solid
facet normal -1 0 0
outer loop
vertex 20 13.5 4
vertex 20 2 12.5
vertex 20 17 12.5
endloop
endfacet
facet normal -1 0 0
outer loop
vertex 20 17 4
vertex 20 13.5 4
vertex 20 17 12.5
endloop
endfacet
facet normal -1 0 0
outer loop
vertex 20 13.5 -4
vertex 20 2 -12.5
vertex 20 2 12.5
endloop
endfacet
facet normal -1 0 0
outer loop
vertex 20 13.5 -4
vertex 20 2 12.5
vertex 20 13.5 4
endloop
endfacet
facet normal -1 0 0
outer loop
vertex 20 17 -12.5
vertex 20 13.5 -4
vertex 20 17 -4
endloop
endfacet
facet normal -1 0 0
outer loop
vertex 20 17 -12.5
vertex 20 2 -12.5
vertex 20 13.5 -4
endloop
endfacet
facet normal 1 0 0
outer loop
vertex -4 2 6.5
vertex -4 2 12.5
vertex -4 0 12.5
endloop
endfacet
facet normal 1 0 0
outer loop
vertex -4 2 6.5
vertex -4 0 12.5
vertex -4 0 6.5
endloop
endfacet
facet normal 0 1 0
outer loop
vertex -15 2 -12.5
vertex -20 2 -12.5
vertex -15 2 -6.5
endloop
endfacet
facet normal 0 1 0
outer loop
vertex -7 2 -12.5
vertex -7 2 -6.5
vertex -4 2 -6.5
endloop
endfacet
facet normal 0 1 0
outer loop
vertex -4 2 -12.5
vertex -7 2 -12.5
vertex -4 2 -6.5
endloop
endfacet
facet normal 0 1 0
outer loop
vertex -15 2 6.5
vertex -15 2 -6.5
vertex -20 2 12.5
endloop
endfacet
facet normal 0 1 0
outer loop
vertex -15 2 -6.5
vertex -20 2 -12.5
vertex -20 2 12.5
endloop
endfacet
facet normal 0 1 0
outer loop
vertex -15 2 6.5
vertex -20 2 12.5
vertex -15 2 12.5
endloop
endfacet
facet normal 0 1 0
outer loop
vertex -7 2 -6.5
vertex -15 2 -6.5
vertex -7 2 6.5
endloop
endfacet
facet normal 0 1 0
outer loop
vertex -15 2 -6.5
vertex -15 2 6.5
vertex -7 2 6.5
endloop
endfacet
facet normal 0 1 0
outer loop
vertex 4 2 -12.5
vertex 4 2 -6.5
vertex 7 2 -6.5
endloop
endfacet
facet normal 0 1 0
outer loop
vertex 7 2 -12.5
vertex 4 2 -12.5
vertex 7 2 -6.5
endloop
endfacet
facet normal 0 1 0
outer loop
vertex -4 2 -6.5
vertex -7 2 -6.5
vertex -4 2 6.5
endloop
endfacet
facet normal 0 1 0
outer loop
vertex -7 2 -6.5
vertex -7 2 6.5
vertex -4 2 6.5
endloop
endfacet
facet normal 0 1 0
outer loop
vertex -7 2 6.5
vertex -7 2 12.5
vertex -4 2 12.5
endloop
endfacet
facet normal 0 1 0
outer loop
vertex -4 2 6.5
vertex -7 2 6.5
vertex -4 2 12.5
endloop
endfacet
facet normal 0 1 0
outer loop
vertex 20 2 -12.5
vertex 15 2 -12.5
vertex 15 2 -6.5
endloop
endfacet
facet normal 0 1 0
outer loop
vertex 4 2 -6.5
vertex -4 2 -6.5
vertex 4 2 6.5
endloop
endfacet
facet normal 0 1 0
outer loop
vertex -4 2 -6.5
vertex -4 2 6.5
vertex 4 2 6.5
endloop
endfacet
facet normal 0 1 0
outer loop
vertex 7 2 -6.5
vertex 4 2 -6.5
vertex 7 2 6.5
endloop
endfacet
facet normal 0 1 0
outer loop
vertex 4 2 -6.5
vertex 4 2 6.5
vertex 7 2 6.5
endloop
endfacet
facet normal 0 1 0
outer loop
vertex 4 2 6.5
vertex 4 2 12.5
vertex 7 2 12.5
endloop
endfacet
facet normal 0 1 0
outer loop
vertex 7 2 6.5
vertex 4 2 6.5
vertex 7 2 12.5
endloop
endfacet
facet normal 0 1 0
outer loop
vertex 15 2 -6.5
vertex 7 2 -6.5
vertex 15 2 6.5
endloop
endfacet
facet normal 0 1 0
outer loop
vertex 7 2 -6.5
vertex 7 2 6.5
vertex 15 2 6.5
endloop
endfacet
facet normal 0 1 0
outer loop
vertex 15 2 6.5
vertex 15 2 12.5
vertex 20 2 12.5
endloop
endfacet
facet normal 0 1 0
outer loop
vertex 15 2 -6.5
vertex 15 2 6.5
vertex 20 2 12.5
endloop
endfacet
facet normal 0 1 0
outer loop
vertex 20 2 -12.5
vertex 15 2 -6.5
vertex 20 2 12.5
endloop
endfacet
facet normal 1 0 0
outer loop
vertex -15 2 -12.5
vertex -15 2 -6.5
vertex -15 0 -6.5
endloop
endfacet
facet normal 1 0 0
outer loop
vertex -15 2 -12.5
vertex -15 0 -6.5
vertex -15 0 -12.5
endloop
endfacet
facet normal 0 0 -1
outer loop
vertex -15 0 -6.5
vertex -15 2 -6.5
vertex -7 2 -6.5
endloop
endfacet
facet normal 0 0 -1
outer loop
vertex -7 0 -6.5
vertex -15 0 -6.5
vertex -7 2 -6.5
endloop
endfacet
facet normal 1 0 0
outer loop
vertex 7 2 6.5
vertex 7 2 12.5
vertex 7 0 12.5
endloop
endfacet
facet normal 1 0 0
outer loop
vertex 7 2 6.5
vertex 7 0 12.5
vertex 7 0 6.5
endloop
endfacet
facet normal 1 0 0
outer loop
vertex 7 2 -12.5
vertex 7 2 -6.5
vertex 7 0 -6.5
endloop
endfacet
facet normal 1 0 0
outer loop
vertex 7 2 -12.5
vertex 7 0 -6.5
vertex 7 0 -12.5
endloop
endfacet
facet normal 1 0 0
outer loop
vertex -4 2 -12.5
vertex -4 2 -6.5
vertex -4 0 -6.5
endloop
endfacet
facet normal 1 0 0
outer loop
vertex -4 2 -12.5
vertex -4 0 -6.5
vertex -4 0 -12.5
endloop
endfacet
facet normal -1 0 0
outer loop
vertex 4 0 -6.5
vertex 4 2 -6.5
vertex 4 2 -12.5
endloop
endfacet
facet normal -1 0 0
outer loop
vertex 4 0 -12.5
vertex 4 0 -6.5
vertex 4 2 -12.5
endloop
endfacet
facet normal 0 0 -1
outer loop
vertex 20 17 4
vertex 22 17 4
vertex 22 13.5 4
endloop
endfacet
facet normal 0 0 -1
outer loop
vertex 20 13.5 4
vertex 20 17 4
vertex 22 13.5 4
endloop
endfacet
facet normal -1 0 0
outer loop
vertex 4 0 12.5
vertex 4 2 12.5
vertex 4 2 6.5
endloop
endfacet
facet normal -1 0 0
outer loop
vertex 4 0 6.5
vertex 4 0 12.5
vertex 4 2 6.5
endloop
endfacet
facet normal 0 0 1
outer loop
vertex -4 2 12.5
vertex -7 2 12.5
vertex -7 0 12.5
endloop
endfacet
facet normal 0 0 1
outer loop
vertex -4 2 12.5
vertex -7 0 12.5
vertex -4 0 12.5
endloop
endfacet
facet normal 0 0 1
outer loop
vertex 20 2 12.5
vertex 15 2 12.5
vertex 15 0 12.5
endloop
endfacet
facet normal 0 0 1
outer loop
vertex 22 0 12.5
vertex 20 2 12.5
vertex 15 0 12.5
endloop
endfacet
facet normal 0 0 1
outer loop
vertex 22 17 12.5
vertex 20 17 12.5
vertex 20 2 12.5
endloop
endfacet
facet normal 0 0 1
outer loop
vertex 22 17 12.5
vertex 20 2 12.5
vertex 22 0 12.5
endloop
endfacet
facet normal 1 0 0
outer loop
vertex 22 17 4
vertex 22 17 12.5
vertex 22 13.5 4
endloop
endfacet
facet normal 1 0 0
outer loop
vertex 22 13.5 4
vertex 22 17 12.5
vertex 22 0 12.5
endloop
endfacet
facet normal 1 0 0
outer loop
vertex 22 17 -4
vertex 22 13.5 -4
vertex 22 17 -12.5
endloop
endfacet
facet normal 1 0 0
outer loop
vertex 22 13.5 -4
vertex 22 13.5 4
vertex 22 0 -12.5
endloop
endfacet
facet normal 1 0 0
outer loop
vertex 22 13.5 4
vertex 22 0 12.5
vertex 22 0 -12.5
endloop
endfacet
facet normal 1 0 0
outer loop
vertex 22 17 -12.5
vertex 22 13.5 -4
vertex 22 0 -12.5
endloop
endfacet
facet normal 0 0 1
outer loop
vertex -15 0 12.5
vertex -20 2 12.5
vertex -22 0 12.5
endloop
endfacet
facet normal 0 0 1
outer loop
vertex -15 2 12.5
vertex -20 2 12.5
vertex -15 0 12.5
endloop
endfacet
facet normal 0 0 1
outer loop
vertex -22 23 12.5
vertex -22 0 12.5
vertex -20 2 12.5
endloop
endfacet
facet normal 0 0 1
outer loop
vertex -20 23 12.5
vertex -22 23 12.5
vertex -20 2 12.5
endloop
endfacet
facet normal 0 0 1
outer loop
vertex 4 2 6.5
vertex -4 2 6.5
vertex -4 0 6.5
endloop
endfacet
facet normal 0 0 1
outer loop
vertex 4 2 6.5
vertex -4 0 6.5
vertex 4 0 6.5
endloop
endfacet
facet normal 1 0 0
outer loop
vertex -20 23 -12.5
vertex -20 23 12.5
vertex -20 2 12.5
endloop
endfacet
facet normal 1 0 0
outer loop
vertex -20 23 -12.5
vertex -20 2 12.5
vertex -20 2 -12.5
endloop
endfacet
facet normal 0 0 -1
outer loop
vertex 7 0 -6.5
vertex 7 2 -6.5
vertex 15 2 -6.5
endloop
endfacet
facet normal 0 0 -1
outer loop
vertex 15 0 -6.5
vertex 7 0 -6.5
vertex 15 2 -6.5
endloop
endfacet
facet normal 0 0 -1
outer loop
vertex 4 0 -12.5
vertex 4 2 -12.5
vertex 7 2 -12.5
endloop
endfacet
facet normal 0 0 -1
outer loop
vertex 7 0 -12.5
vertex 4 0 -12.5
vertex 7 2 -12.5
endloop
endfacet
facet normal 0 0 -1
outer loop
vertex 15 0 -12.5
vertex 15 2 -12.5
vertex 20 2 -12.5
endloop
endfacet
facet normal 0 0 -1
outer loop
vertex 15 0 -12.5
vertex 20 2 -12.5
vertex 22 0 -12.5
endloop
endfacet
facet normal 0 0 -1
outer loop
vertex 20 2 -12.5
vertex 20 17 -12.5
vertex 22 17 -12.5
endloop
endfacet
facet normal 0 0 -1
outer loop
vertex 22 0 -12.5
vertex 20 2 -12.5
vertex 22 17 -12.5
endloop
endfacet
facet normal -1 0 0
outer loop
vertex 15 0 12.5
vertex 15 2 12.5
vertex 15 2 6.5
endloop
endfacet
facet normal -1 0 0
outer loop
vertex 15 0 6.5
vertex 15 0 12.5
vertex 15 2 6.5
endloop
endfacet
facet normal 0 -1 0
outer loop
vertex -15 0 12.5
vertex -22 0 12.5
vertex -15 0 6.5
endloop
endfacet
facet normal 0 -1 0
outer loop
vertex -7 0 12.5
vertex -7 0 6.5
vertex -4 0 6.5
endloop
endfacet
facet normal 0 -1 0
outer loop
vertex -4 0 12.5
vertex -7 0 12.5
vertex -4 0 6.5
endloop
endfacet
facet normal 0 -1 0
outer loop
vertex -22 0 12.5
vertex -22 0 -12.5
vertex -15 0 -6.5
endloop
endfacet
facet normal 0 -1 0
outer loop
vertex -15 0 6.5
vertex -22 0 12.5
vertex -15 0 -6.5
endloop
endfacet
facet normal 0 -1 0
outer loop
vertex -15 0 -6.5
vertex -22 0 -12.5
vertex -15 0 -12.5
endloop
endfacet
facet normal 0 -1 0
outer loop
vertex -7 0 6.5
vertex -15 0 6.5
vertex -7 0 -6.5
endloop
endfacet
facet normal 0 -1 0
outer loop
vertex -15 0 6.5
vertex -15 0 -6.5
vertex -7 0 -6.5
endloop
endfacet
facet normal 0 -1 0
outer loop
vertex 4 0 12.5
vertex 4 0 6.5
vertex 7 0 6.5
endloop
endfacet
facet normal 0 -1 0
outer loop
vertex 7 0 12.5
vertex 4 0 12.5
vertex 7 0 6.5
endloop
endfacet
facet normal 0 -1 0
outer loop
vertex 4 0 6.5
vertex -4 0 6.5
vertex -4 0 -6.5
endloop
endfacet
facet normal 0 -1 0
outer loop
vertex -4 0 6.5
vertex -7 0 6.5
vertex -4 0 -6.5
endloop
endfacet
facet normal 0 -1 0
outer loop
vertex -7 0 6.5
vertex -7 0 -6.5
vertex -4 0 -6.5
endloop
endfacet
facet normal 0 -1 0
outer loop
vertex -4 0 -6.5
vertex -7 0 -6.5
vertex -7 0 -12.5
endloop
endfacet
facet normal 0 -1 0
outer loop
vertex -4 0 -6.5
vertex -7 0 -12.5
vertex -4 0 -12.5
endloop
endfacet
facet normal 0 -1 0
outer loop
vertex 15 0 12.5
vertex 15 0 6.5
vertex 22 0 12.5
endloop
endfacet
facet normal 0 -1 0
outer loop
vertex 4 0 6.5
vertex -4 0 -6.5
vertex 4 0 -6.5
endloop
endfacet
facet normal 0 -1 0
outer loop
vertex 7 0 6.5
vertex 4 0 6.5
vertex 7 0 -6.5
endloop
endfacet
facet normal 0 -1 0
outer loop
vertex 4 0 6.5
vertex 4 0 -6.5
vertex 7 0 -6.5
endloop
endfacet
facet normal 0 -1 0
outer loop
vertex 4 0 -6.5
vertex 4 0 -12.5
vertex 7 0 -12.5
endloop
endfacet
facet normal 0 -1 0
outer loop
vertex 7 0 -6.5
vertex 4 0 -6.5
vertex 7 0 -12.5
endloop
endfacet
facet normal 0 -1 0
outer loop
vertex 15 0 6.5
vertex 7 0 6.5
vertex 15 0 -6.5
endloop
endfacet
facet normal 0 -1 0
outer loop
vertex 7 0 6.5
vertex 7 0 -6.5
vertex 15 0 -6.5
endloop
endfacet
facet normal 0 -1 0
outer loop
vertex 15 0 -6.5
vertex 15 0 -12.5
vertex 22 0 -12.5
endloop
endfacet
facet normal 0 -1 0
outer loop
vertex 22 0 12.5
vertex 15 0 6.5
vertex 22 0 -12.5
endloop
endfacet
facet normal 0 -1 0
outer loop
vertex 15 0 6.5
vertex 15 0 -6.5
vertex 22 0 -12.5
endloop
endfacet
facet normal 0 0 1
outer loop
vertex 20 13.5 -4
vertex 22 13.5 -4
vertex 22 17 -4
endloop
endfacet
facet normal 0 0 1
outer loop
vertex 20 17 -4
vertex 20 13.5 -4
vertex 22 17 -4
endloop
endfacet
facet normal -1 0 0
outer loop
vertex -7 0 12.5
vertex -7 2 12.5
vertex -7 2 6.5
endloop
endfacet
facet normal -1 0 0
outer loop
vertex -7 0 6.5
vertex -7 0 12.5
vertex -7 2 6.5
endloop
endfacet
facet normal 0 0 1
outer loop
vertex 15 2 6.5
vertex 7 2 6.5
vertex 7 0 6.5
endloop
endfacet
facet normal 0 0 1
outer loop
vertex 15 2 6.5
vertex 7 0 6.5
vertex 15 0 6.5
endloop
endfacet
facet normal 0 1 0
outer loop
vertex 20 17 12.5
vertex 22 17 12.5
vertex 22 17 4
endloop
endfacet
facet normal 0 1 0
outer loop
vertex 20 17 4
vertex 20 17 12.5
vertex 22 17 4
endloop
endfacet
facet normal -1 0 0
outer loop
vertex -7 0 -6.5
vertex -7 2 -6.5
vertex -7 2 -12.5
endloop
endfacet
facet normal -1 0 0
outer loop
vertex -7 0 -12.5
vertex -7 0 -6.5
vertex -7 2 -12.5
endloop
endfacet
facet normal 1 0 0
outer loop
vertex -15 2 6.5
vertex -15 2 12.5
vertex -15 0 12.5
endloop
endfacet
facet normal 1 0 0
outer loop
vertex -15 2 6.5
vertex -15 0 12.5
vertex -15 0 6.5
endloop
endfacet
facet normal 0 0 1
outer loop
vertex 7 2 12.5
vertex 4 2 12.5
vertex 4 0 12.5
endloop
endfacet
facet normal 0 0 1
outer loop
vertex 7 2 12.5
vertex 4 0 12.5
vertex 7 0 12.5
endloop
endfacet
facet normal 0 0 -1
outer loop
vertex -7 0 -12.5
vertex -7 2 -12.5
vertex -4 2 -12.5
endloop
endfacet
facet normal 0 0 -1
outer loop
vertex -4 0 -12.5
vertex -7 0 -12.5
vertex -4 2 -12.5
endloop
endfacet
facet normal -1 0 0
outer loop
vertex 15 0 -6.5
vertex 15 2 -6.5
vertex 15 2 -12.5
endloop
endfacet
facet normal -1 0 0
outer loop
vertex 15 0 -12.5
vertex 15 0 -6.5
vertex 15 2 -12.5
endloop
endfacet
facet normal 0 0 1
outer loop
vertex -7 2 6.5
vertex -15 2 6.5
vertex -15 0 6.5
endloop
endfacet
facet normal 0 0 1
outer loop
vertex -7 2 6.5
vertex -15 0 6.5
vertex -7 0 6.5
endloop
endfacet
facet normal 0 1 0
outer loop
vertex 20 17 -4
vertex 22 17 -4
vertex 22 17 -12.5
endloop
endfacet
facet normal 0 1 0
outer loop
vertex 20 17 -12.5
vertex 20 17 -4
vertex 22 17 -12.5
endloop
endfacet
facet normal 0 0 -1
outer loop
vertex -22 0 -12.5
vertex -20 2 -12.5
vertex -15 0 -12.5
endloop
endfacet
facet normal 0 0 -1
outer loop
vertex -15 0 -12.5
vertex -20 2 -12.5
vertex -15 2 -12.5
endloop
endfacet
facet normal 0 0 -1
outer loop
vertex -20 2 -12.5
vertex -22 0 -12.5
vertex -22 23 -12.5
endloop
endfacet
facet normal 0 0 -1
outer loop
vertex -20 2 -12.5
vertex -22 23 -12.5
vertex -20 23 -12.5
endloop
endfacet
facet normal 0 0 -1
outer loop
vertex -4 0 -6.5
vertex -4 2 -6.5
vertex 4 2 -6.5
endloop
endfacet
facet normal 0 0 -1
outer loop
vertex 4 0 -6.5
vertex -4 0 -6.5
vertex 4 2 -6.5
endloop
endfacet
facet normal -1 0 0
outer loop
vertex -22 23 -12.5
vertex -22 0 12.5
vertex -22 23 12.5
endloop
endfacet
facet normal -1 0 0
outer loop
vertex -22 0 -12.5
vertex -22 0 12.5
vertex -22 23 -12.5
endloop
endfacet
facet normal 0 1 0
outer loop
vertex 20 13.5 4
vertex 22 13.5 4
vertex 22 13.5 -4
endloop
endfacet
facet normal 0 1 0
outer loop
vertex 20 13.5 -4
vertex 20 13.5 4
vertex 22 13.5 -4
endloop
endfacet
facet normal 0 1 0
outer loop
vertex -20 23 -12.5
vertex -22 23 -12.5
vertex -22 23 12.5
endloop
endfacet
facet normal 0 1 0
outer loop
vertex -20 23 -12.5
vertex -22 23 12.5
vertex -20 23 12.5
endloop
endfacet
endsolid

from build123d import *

# Parameters (mm, degrees)
SKETCH2_W           = 44
SKETCH2_H           = 29
BOSS_EXTRUDE1_DEPTH = 23
SKETCH3_W           = 40
SKETCH3_H           = 25
CUT_EXTRUDE1_DEPTH  = 21
SKETCH4_W           = 20.7
SKETCH4_H           = 2
CUT_EXTRUDE2_DEPTH  = 33
SKETCH5_W           = 30
SKETCH5_H           = 12.3
CUT_EXTRUDE3_DEPTH  = 2
CUT_EXTRUDE5_DEPTH  = 2
SKETCH11_W          = 3.9
SKETCH11_H          = 8.6
SKETCH11_W_2        = 7
SKETCH11_H_2        = 1.5
CUT_EXTRUDE6_DEPTH  = 2
SKETCH13_W          = 8
SKETCH13_H          = 6
CUT_EXTRUDE8_DEPTH  = 2
SKETCH14_W          = 44
SKETCH14_H          = 2
CUT_EXTRUDE9_DEPTH  = 23


with BuildPart() as part:
    # Sketch2 → Boss-Extrude1 (new body)
    with BuildSketch(Plane(origin=(0, 0, 0), x_dir=(1, 0, 0), z_dir=(0, 1, 0))):
        Rectangle(SKETCH2_W, SKETCH2_H)
    extrude(amount=BOSS_EXTRUDE1_DEPTH)

    # Sketch3 → Cut-Extrude1 (cut)
    with BuildSketch(Plane(origin=(0, 23, 0), x_dir=(1, 0, 0), z_dir=(0, 1, 0))):
        Rectangle(SKETCH3_W, SKETCH3_H)
    extrude(amount=-CUT_EXTRUDE1_DEPTH, mode=Mode.SUBTRACT)

    # Sketch4 → Cut-Extrude2 (cut)
    with BuildSketch(Plane.XY.offset(14.5)):
        with Locations((0.25, 18.2)):
            Rectangle(SKETCH4_W, SKETCH4_H)
    extrude(amount=-CUT_EXTRUDE2_DEPTH, mode=Mode.SUBTRACT)

    # Sketch5 → Cut-Extrude3 (cut)
    with BuildSketch(Plane.XY.offset(14.5)):
        with Locations((0, 8.15)):
            Rectangle(SKETCH5_W, SKETCH5_H)
    extrude(amount=-CUT_EXTRUDE3_DEPTH, mode=Mode.SUBTRACT)

    # Sketch8 → Cut-Extrude5 (cut)
    with BuildSketch(Plane(origin=(22, 0, 0), x_dir=(0, 0, -1), z_dir=(1, 0, 0))):
        Polygon((-12.5, 17), (-4, 17), (-4, 13.5), (4, 13.5), (4, 17), (12.5, 17), (12.5, 23), (-12.5, 23), align=None)
    extrude(amount=-CUT_EXTRUDE5_DEPTH, mode=Mode.SUBTRACT)

    # Sketch11 → Cut-Extrude6 (cut)
    with BuildSketch(Plane(origin=(0, 0, -14.5), x_dir=(-1, 0, 0), z_dir=(0, 0, -1))):
        with Locations((-18.05, 6.3)):
            Rectangle(SKETCH11_W, SKETCH11_H)
        with Locations((12.4, 2.75)):
            Rectangle(SKETCH11_W_2, SKETCH11_H_2)
    extrude(amount=-CUT_EXTRUDE6_DEPTH, mode=Mode.SUBTRACT)

    # Sketch13 → Cut-Extrude8 (cut)
    with BuildSketch(Plane(origin=(0, 2, 0), x_dir=(1, 0, 0), z_dir=(0, 1, 0))):
        with Locations((-11, -9.5)):
            Rectangle(SKETCH13_W, SKETCH13_H)
        with Locations((0, -9.5)):
            Rectangle(SKETCH13_W, SKETCH13_H)
        with Locations((11, 9.5)):
            Rectangle(SKETCH13_W, SKETCH13_H)
        with Locations((11, -9.5)):
            Rectangle(SKETCH13_W, SKETCH13_H)
        with Locations((-11, 9.5)):
            Rectangle(SKETCH13_W, SKETCH13_H)
        with Locations((0, 9.5)):
            Rectangle(SKETCH13_W, SKETCH13_H)
    extrude(amount=-CUT_EXTRUDE8_DEPTH, mode=Mode.SUBTRACT)

    # Sketch14 → Cut-Extrude9 (cut)
    with BuildSketch(Plane(origin=(0, 23, 0), x_dir=(1, 0, 0), z_dir=(0, 1, 0))):
        with Locations((0, -13.5)):
            Rectangle(SKETCH14_W, SKETCH14_H)
        with Locations((0, 13.5)):
            Rectangle(SKETCH14_W, SKETCH14_H)
    extrude(amount=-CUT_EXTRUDE9_DEPTH, mode=Mode.SUBTRACT)


solid = part.part
